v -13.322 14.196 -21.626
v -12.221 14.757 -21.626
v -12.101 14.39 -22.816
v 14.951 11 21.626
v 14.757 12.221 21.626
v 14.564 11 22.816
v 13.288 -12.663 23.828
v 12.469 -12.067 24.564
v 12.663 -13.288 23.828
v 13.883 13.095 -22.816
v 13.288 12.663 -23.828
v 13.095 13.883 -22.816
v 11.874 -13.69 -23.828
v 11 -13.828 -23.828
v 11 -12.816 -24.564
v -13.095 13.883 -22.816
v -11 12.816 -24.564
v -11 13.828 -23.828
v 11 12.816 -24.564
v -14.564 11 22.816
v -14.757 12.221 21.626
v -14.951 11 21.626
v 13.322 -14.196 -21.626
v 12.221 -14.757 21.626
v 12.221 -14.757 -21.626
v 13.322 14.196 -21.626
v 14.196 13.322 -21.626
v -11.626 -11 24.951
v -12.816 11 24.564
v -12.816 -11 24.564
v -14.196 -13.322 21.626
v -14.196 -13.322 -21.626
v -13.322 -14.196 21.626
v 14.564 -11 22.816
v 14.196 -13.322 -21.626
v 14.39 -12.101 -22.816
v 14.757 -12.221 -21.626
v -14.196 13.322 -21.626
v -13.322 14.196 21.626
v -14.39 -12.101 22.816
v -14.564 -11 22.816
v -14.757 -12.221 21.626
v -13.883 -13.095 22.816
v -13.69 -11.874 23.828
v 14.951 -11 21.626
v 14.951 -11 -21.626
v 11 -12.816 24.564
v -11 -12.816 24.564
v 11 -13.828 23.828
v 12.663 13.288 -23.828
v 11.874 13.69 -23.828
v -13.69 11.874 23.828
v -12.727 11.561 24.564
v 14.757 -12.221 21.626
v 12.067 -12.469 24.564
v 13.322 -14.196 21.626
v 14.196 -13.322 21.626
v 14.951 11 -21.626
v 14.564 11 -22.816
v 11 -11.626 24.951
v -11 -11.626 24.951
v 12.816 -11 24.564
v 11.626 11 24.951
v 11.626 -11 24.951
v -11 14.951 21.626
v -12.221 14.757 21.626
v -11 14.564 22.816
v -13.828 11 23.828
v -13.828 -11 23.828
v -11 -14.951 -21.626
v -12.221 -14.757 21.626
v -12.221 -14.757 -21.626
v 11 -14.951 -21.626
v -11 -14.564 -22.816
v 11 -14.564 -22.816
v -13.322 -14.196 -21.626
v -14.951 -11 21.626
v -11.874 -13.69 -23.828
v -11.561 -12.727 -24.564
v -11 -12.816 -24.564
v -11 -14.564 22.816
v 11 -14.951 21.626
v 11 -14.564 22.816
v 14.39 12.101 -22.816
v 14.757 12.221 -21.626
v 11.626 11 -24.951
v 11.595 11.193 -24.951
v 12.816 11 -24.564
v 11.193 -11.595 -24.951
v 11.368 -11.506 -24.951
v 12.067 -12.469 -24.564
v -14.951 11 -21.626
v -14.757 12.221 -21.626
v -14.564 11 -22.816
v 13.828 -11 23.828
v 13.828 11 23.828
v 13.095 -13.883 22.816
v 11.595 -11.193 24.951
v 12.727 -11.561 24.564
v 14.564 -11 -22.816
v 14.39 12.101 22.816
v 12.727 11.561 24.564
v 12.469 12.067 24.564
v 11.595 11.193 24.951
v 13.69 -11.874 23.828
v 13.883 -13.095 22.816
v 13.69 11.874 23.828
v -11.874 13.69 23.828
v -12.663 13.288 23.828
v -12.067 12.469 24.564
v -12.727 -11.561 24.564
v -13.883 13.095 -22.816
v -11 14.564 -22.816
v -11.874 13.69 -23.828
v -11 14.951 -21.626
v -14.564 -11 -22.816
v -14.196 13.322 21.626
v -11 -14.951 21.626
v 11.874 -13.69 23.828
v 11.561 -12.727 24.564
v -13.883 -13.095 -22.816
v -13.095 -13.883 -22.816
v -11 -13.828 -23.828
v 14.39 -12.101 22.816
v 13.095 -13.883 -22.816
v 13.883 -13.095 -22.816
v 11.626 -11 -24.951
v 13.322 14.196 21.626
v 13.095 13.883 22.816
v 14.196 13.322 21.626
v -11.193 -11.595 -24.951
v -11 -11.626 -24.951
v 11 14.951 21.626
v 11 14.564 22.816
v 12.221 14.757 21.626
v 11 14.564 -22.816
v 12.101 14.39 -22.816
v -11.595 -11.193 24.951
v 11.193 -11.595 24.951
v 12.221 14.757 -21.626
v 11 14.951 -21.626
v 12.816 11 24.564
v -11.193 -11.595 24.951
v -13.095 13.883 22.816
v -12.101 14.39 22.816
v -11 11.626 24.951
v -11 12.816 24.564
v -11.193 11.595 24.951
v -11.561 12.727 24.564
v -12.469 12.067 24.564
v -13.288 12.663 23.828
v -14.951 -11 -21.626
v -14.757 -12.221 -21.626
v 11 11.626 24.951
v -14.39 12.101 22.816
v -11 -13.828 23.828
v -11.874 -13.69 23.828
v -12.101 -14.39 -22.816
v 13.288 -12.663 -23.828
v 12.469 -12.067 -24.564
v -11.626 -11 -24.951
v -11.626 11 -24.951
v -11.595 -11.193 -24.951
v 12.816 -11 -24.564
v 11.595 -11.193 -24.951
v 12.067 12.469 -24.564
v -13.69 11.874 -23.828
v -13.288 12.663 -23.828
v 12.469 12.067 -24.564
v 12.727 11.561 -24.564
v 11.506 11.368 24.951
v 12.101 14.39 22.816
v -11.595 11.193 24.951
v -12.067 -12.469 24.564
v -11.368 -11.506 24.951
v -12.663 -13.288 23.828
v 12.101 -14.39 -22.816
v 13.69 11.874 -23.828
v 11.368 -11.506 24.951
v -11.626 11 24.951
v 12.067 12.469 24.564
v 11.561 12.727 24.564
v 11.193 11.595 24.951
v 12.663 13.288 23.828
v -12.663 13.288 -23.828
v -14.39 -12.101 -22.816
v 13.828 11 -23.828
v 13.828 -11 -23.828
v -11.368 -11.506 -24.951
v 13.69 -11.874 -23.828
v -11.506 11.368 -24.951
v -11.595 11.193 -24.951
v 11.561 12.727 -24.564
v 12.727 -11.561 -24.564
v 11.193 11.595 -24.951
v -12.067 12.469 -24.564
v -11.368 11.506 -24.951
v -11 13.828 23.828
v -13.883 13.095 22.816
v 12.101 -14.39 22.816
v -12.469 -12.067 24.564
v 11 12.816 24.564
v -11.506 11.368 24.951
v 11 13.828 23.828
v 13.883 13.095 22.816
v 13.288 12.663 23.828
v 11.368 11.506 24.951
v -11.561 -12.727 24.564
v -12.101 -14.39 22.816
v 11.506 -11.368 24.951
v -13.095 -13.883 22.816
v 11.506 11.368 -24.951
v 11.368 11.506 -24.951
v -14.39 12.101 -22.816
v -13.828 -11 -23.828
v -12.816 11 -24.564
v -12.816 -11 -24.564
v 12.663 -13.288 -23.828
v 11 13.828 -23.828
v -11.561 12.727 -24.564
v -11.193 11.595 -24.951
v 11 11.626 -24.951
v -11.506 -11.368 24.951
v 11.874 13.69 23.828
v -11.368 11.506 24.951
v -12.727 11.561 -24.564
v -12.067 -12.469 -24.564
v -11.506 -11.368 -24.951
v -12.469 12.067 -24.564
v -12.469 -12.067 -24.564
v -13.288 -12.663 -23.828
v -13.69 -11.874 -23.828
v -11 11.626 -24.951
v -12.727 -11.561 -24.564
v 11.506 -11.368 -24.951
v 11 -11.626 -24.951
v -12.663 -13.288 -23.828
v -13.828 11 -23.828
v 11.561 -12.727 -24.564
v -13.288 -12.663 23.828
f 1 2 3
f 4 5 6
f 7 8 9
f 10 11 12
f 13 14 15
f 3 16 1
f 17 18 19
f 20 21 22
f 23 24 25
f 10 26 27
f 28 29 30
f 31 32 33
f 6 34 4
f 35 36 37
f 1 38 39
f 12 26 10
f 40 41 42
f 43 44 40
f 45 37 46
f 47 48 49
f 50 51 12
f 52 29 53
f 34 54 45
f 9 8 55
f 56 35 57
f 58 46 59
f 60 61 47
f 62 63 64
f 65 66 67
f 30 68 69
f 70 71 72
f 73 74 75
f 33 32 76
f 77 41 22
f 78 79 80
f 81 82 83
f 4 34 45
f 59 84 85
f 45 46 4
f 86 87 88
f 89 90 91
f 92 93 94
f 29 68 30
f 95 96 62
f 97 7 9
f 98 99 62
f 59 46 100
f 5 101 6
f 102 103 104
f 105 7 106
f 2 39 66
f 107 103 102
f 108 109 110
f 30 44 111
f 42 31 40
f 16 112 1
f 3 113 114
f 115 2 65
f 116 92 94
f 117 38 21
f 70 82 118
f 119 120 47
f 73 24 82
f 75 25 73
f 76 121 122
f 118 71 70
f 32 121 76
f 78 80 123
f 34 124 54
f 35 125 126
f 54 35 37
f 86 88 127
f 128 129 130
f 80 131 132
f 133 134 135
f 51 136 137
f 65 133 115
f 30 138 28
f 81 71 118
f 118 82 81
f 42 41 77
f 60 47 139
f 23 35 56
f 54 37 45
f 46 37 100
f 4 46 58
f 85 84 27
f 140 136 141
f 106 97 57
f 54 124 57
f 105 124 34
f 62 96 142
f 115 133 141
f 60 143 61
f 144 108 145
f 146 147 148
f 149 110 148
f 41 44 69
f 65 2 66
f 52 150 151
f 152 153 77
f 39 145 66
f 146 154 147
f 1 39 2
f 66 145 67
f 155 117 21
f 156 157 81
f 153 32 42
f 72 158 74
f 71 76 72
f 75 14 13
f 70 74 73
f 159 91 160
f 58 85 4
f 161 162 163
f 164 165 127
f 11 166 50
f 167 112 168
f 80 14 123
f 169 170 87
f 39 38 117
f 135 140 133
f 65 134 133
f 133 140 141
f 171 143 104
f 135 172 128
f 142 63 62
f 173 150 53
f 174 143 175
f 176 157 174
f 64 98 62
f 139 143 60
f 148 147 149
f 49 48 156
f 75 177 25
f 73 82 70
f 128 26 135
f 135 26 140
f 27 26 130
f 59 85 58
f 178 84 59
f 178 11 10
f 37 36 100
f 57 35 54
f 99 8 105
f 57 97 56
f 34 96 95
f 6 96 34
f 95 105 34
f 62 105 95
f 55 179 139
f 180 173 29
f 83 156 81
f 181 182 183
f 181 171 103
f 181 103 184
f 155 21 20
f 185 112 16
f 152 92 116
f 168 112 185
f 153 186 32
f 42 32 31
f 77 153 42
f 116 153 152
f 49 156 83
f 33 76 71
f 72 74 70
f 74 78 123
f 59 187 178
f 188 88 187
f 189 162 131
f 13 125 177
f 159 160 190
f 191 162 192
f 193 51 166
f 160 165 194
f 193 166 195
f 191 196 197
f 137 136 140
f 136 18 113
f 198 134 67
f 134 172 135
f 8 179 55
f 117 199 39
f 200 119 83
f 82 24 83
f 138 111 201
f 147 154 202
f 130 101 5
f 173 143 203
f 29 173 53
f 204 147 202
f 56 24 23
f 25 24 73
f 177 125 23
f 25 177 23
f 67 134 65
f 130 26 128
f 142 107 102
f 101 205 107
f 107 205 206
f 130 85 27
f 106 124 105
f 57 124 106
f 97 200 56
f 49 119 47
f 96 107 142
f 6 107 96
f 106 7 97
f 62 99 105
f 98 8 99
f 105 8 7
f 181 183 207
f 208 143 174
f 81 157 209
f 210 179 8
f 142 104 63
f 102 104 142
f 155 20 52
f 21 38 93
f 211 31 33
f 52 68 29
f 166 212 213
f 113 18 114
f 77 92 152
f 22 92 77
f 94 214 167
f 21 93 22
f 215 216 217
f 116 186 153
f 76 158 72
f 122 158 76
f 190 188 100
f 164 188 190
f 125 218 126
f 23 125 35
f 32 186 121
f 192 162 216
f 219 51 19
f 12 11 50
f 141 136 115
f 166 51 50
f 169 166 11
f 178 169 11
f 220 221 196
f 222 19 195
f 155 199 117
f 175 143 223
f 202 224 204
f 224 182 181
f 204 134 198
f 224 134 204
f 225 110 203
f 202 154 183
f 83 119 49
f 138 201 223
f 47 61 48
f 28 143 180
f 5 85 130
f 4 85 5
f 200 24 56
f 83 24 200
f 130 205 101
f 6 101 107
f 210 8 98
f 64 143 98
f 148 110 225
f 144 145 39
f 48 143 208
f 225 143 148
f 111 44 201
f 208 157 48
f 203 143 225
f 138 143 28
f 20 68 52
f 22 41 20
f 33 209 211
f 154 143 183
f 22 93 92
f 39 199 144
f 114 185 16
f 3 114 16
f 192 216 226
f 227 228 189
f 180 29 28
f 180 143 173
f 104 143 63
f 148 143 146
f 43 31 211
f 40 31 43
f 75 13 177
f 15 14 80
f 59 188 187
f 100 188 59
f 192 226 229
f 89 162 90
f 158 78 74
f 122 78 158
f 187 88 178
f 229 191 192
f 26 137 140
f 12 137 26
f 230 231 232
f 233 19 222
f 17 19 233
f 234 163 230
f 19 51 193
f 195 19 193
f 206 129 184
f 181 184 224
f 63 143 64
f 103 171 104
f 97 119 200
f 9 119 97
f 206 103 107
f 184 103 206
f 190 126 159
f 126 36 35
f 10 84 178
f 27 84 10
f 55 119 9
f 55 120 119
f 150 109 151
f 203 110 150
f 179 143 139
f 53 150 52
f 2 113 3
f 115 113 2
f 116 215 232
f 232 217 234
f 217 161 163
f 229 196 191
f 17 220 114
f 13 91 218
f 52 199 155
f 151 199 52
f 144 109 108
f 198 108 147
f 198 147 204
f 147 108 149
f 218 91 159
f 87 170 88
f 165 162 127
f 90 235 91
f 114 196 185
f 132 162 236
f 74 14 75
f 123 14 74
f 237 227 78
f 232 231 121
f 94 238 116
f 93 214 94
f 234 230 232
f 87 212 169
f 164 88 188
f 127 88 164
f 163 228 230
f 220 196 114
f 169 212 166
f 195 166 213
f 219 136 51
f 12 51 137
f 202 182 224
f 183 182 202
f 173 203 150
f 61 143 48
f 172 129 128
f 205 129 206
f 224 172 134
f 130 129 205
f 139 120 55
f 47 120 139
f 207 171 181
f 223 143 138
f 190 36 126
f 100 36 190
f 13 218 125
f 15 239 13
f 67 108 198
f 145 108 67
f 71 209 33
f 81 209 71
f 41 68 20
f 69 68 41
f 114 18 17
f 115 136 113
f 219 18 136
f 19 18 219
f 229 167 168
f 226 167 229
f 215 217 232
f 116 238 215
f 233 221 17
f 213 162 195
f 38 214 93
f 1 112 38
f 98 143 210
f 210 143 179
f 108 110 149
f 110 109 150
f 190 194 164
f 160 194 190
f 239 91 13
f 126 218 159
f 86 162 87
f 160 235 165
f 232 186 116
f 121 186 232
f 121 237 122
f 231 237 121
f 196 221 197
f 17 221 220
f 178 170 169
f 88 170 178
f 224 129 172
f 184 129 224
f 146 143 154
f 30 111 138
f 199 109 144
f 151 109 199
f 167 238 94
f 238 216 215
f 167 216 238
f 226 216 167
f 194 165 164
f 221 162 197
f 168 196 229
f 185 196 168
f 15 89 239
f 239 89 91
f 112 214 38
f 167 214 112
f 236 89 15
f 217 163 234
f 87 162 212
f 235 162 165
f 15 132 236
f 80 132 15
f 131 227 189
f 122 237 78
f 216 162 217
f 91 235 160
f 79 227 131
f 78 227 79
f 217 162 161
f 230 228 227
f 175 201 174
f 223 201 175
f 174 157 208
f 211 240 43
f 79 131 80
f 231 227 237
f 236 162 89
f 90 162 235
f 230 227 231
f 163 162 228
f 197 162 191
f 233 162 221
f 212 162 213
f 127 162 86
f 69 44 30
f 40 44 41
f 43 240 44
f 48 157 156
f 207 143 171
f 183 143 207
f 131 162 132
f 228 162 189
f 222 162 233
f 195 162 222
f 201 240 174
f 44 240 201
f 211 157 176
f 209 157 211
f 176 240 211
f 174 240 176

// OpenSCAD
X=0;
Y=1;
Z=2;

r = 4;
A = [30,30,50];

a =(A - [2*r,2*r,2*r])/2;

x=a[X];
y=a[Y];
z=a[Z];

vertice =[
	[x,y,z],
	[-x,y,z],
	[-x,-y,z],
	[x,-y,z],

	[x,y,-z],
	[-x,y,-z],
	[-x,-y,-z],
	[x,-y,-z]
];

%cube(A,center=true);

hull(){
	for(pos = vertice)
		translate(pos)
			sphere(r = r,$fn = 20);
}
